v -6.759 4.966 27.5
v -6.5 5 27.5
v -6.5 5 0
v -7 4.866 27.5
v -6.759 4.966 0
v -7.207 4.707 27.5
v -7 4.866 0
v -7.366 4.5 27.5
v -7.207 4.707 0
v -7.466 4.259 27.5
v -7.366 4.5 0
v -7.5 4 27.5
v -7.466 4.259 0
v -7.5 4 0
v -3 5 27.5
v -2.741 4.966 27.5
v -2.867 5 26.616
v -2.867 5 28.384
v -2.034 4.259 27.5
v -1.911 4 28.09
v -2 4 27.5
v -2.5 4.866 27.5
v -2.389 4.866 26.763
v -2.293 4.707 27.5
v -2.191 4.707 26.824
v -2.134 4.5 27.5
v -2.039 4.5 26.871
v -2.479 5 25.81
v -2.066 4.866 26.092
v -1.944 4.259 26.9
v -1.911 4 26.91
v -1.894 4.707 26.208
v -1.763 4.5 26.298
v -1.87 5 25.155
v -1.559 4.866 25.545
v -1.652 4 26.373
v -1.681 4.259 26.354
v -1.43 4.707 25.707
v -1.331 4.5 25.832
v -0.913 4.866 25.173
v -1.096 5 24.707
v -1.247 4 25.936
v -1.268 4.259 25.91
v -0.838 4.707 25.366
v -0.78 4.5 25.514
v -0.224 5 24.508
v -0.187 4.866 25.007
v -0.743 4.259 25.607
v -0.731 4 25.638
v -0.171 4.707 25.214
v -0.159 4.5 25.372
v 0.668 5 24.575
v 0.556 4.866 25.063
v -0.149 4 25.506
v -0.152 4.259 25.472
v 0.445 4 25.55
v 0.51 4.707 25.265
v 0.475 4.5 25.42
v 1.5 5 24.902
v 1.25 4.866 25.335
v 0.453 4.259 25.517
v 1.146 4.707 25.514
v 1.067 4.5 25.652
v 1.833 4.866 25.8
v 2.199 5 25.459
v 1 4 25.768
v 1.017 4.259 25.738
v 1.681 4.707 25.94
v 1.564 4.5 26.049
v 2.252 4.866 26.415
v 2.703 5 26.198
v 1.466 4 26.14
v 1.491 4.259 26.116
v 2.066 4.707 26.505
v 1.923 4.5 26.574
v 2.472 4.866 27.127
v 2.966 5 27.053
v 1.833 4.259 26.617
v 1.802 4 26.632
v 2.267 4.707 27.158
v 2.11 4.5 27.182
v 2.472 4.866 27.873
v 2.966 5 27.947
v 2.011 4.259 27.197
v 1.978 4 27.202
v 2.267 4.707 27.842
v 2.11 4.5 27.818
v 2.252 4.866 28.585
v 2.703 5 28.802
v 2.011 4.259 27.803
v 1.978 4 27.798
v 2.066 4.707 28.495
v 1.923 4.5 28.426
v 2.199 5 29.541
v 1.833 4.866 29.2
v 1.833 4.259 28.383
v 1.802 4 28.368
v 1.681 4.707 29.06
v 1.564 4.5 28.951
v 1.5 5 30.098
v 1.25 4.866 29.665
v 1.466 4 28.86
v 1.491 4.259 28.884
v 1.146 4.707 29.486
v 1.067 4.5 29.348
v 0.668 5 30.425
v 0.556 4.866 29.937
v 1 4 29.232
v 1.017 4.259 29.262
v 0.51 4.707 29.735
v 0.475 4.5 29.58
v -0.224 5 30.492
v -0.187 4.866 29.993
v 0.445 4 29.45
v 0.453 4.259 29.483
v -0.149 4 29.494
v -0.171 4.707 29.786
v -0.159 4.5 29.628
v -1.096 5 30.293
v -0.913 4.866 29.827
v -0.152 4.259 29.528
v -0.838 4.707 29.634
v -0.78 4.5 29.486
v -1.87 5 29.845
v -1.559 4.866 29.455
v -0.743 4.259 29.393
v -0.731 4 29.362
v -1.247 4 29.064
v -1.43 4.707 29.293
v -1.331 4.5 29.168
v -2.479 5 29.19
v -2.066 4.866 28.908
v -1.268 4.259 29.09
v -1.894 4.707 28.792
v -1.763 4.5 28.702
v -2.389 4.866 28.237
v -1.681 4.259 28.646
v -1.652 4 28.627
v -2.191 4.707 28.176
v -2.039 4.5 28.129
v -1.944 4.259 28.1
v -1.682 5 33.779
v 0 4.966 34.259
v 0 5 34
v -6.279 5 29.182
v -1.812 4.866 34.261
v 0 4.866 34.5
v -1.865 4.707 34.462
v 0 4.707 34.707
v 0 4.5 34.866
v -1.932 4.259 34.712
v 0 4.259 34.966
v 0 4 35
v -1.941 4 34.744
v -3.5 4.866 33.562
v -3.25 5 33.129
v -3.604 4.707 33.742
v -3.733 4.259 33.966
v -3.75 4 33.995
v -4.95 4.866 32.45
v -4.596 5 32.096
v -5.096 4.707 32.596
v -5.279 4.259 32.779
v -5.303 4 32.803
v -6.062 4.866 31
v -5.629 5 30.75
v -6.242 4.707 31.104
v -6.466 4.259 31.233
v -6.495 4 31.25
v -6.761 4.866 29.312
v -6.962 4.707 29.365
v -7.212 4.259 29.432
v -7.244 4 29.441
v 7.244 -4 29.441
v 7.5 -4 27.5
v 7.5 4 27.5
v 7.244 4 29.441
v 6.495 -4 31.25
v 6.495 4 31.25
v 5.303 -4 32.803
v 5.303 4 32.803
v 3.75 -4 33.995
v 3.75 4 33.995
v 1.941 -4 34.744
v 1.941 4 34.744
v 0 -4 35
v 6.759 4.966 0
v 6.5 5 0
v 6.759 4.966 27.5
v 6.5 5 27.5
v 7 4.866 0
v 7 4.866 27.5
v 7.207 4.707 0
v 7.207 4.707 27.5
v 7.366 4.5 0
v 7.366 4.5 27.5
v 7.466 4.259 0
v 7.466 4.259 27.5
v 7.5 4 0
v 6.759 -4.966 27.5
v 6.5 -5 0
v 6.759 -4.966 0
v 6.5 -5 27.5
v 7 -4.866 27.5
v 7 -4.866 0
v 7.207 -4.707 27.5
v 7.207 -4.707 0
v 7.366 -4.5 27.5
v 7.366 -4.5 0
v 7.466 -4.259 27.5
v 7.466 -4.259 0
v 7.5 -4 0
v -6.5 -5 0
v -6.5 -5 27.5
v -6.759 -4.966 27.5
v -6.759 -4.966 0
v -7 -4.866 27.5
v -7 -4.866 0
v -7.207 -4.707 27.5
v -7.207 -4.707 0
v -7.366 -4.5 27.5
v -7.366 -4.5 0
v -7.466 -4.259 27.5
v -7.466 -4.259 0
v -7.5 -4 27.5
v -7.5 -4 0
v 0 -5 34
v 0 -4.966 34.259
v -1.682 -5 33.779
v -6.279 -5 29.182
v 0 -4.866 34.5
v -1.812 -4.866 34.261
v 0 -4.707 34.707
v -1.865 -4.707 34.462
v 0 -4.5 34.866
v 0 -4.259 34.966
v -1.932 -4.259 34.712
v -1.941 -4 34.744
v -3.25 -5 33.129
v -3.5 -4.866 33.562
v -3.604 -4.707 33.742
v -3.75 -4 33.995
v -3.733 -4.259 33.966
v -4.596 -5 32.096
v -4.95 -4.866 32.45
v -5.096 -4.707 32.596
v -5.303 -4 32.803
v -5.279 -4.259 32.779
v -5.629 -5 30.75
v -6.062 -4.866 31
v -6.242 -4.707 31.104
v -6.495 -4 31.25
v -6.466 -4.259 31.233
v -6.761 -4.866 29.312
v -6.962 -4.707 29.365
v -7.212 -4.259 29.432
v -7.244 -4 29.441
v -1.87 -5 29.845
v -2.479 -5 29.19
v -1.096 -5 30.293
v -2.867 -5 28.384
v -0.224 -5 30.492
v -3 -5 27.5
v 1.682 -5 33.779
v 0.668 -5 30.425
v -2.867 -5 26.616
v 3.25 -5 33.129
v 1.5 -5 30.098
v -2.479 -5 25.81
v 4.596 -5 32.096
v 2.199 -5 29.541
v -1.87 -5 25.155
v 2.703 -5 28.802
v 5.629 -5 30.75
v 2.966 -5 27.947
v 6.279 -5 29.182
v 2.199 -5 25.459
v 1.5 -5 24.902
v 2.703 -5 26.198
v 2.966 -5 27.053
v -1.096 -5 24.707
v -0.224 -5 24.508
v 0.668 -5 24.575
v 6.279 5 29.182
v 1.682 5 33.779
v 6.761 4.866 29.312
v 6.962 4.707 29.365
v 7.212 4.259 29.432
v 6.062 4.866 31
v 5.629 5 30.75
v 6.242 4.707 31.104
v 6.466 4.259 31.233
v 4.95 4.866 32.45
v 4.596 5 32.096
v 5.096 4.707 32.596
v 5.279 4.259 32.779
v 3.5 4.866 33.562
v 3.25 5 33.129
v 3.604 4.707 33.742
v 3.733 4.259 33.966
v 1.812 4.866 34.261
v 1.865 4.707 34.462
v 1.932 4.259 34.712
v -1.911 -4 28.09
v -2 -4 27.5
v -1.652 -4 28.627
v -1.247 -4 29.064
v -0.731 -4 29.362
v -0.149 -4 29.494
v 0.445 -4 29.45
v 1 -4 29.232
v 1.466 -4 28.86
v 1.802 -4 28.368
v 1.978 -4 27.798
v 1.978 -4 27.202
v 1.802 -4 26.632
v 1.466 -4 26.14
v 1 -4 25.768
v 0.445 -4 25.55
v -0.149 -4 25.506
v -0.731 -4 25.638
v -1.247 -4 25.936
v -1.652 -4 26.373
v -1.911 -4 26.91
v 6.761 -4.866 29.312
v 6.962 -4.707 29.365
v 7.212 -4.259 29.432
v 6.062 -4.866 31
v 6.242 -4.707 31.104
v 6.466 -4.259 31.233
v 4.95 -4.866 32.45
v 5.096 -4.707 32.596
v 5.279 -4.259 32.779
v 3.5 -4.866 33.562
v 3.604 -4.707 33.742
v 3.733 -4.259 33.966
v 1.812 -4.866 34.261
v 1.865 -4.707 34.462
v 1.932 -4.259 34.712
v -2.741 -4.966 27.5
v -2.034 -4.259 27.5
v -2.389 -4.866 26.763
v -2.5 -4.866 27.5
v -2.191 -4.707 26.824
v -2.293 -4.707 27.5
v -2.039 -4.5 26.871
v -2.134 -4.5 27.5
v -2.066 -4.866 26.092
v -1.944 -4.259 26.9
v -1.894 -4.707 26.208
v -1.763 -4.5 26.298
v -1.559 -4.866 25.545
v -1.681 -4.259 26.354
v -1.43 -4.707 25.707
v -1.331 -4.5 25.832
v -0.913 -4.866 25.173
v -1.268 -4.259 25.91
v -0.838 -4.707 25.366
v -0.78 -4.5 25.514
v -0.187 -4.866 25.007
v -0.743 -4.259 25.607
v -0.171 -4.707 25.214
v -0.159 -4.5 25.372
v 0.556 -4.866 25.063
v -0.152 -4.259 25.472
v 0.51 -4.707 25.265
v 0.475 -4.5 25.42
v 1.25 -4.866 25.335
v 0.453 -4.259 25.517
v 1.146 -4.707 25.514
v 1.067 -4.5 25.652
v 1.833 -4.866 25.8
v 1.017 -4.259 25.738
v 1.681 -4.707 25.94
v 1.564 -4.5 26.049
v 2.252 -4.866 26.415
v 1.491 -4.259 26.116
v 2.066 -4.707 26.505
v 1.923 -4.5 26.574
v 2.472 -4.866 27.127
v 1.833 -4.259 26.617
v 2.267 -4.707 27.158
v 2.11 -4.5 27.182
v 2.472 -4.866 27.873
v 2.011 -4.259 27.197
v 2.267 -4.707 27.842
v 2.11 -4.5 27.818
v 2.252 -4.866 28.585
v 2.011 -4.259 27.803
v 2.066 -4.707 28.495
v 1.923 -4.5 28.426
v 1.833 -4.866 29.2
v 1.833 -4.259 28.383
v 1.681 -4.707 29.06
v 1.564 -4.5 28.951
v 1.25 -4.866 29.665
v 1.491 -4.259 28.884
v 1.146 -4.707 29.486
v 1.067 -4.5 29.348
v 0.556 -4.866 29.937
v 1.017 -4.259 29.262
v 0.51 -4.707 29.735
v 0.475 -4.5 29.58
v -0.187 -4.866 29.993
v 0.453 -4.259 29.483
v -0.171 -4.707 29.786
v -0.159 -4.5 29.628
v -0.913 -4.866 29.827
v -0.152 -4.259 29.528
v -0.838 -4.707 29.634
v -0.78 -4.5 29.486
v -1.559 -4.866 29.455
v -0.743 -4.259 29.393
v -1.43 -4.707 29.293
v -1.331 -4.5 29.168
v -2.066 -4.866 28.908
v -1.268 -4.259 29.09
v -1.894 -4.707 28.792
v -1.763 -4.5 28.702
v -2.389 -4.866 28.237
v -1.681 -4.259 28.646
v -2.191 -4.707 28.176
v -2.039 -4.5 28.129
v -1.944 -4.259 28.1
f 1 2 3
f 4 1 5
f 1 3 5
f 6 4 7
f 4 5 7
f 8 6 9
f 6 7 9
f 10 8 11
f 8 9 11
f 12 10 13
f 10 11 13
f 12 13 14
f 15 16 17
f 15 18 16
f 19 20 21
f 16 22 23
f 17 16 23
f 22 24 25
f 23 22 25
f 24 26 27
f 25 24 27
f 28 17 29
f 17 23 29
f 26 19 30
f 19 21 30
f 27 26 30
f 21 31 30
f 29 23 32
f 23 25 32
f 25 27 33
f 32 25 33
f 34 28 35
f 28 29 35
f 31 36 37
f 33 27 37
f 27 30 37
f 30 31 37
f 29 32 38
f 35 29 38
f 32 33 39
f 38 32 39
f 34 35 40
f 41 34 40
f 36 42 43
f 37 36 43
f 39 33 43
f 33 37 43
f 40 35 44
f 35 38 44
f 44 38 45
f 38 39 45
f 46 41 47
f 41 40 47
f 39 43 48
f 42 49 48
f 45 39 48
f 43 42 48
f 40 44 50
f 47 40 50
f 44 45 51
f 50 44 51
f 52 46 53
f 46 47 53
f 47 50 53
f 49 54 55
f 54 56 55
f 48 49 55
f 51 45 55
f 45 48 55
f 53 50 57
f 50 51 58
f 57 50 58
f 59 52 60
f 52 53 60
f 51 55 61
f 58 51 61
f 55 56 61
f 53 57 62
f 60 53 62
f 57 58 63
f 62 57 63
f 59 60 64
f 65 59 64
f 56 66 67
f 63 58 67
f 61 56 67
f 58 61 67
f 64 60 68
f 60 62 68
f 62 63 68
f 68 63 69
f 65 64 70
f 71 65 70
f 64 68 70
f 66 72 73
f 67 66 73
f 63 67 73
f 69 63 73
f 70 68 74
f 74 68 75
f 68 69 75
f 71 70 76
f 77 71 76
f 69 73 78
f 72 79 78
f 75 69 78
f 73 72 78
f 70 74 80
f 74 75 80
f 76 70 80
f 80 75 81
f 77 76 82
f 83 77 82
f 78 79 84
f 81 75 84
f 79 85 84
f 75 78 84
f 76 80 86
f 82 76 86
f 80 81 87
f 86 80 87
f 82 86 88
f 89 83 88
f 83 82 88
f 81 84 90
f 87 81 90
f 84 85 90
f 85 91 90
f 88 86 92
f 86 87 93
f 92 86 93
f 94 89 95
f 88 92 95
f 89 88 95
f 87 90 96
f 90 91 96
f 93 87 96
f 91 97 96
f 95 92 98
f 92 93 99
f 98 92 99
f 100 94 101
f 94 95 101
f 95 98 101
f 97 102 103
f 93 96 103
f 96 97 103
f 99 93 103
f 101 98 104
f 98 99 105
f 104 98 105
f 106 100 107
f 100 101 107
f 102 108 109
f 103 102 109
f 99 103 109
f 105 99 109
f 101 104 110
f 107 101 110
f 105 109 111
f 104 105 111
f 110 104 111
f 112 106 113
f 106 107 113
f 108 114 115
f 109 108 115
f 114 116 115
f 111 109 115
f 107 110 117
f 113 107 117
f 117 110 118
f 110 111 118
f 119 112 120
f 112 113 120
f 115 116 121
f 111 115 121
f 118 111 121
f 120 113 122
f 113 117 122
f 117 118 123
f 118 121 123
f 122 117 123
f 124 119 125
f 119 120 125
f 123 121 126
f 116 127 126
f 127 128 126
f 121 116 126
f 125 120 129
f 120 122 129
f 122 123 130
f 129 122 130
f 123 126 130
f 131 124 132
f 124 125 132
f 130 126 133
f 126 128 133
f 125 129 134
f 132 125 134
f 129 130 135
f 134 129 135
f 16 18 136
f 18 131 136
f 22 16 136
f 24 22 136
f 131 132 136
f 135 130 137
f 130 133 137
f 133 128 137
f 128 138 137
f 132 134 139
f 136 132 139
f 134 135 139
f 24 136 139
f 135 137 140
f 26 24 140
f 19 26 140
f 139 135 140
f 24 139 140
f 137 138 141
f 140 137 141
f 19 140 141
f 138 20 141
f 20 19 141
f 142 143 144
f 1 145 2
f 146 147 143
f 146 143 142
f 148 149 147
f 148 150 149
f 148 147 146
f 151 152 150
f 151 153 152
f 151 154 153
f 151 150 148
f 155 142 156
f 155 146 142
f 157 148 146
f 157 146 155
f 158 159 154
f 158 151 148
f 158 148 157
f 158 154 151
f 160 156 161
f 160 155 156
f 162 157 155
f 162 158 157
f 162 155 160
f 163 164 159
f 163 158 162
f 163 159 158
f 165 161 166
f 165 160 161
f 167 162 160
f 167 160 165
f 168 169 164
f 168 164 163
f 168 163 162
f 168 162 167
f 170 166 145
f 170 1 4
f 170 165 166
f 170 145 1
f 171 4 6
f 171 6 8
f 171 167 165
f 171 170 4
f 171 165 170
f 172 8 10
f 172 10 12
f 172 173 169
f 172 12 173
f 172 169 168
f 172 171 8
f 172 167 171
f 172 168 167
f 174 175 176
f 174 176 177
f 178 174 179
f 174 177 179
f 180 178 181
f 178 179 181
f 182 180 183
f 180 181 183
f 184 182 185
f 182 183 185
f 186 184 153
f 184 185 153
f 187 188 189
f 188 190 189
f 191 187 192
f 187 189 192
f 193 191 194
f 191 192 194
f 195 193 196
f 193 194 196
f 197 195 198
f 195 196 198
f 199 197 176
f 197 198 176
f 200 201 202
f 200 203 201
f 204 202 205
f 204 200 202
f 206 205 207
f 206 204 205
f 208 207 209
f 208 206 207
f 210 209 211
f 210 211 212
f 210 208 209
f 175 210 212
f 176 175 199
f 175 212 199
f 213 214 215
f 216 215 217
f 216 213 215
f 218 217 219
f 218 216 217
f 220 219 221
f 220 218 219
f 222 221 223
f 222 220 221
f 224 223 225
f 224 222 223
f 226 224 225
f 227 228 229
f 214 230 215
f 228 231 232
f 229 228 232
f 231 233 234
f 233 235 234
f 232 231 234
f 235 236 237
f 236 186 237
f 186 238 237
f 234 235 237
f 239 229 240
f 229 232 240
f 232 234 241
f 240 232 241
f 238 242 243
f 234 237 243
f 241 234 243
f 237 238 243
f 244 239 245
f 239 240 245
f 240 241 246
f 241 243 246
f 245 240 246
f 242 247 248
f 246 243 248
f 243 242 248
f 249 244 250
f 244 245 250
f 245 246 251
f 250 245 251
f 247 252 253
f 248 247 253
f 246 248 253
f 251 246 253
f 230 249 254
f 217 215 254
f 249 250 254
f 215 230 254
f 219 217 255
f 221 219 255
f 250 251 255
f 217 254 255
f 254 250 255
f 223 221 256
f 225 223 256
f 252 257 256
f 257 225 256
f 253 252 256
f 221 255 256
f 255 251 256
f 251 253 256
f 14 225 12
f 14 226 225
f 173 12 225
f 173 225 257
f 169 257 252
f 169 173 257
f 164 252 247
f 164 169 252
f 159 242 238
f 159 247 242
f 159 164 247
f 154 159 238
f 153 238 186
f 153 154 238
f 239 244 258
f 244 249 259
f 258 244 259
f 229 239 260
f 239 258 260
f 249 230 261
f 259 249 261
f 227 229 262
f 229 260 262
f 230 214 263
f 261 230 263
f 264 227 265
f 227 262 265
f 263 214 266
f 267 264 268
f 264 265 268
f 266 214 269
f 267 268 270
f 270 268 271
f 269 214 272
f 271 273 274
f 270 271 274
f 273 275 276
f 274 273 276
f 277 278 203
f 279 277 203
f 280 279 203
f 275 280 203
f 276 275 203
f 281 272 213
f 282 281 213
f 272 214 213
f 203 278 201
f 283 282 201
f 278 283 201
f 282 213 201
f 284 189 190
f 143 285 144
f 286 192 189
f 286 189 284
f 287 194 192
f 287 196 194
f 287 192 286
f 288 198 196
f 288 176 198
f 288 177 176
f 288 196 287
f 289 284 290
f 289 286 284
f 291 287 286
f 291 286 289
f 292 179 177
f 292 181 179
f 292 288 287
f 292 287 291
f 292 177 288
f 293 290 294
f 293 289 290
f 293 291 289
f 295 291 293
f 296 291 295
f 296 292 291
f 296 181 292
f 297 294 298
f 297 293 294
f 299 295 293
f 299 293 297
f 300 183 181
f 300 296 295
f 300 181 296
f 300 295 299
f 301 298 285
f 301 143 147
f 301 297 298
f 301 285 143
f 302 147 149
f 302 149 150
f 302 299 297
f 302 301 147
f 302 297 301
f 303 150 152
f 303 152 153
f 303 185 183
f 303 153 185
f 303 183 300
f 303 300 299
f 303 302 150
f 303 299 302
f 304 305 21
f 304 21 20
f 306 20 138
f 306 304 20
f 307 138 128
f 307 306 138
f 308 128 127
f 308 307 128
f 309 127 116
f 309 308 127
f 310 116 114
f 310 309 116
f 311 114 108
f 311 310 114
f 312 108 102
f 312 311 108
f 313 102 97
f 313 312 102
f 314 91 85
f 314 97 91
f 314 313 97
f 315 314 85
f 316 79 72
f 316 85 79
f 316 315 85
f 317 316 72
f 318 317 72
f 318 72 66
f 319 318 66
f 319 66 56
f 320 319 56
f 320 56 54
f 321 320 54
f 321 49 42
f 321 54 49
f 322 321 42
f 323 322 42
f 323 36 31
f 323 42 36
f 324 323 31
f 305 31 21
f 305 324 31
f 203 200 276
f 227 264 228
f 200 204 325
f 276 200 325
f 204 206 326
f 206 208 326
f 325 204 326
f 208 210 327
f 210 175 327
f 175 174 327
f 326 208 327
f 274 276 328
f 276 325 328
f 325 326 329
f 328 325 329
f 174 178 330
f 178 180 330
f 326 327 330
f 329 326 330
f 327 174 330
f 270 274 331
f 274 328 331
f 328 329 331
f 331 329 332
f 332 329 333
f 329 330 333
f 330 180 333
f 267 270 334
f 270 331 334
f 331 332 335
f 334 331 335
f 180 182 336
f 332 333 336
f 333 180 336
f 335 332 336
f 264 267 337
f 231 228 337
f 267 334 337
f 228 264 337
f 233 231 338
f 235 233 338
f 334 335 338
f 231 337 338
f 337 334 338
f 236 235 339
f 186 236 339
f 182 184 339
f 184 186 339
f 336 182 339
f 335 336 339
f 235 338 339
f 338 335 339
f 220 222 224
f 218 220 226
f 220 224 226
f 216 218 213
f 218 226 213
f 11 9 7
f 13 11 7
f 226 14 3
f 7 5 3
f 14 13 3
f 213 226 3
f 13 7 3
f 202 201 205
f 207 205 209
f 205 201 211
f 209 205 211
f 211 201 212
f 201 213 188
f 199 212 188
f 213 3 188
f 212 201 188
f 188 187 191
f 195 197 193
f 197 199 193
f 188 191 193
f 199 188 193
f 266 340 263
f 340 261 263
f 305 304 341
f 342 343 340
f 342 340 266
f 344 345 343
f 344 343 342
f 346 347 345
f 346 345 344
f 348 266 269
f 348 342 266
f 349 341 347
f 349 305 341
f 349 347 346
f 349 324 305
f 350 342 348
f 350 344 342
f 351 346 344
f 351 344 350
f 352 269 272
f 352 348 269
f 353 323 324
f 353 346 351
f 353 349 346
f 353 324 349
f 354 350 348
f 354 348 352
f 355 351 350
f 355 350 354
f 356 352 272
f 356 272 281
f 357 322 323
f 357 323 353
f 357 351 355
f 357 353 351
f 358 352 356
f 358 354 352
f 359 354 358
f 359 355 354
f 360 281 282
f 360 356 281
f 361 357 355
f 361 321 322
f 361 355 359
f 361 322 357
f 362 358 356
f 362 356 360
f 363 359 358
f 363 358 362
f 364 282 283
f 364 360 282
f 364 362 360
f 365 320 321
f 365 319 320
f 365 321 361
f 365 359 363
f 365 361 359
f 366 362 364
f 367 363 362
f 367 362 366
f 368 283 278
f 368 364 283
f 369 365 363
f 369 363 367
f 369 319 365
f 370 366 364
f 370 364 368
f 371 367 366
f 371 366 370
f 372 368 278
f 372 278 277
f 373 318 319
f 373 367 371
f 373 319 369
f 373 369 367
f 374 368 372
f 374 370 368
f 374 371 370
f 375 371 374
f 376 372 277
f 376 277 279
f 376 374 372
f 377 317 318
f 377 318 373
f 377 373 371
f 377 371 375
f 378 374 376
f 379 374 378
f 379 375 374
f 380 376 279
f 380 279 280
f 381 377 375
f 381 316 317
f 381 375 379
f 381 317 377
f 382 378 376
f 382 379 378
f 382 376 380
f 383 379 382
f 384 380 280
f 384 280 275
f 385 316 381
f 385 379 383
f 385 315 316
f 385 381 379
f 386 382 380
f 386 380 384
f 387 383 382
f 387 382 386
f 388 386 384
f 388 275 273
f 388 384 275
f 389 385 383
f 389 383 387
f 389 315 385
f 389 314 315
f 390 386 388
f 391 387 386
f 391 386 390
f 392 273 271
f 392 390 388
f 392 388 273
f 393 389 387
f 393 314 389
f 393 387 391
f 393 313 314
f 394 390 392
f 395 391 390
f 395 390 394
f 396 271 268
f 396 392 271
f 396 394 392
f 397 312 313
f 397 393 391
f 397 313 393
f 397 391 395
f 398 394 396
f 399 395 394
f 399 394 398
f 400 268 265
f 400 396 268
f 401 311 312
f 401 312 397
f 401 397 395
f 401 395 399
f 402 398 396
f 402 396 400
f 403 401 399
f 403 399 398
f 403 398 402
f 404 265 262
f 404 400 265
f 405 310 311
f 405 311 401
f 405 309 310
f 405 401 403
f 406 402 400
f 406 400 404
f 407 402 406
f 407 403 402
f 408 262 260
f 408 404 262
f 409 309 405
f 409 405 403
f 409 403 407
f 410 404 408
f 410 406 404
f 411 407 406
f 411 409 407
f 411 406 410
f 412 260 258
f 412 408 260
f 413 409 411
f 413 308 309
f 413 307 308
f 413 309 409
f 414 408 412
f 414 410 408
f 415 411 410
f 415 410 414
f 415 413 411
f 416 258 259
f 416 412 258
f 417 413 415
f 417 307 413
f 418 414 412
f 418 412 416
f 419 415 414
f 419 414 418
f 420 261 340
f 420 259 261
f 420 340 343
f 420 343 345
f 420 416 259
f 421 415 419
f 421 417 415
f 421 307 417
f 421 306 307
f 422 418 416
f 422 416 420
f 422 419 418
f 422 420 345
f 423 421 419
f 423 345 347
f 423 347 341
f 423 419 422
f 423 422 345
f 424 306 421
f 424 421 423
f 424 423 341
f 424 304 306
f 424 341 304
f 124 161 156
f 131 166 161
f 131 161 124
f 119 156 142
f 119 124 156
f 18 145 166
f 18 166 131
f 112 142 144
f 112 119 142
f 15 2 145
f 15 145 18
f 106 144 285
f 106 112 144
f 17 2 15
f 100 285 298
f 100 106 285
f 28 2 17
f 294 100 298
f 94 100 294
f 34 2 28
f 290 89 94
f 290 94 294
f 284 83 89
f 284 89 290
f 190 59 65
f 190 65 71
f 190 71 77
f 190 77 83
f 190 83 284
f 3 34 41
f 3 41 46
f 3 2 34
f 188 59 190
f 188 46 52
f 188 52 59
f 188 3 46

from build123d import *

# Parameters (mm, degrees)
SKETCH1_W               = 15
SKETCH1_H               = 10
BOSS_EXTRUDE1_DEPTH     = 35
FILLET1_R               = 7.5
CUT_EXTRUDE1_DEPTH      = 38.165171868
CUT_EXTRUDE1_DEPTH_BACK = 38.165171868
SKETCH2_R               = 2
FILLET2_R               = 1


with BuildPart() as part:
    # Sketch1 → Boss-Extrude1 (new body)
    with BuildSketch(Plane.XY):
        Rectangle(SKETCH1_W, SKETCH1_H)
    extrude(amount=BOSS_EXTRUDE1_DEPTH)

    # Fillet1
    fillet1_edges = [part.edges().sort_by_distance(p)[0] for p in [
        (7.5, 0, 35),
        (-7.5, 0, 35),
    ]]
    fillet(fillet1_edges, radius=FILLET1_R - 0.0001)  # a hair under: the kernel refuses the full size

    # Sketch2 → Cut-Extrude1 (cut, two sides: drawn at the far end of the back side and taken through both)
    with BuildSketch(Plane(origin=(0, 5, 0), x_dir=(1, 0, 0), z_dir=(0, 1, 0)).offset(-CUT_EXTRUDE1_DEPTH_BACK)):
        with Locations(Location((0, -27.5, 0), (0, 0, 180))):
            Circle(SKETCH2_R)
    extrude(amount=CUT_EXTRUDE1_DEPTH + CUT_EXTRUDE1_DEPTH_BACK, mode=Mode.SUBTRACT)

    # Fillet2
    fillet2_edges = [part.edges().sort_by_distance(p)[0] for p in [
        (7.5, 5, 13.75005),
        (7.5, -5, 13.75005),
        (-7.5, -5, 13.75005),
        (-5.303330148, -5, 32.803330148),
        (5.303330148, -5, 32.803330148),
        (-7.5, 5, 13.75005),
        (-5.303330148, 5, 32.803330148),
        (5.303330148, 5, 32.803330148),
        (2, -5, 27.5),
        (2, 5, 27.5),
    ]]
    fillet(fillet2_edges, radius=FILLET2_R)


solid = part.part
